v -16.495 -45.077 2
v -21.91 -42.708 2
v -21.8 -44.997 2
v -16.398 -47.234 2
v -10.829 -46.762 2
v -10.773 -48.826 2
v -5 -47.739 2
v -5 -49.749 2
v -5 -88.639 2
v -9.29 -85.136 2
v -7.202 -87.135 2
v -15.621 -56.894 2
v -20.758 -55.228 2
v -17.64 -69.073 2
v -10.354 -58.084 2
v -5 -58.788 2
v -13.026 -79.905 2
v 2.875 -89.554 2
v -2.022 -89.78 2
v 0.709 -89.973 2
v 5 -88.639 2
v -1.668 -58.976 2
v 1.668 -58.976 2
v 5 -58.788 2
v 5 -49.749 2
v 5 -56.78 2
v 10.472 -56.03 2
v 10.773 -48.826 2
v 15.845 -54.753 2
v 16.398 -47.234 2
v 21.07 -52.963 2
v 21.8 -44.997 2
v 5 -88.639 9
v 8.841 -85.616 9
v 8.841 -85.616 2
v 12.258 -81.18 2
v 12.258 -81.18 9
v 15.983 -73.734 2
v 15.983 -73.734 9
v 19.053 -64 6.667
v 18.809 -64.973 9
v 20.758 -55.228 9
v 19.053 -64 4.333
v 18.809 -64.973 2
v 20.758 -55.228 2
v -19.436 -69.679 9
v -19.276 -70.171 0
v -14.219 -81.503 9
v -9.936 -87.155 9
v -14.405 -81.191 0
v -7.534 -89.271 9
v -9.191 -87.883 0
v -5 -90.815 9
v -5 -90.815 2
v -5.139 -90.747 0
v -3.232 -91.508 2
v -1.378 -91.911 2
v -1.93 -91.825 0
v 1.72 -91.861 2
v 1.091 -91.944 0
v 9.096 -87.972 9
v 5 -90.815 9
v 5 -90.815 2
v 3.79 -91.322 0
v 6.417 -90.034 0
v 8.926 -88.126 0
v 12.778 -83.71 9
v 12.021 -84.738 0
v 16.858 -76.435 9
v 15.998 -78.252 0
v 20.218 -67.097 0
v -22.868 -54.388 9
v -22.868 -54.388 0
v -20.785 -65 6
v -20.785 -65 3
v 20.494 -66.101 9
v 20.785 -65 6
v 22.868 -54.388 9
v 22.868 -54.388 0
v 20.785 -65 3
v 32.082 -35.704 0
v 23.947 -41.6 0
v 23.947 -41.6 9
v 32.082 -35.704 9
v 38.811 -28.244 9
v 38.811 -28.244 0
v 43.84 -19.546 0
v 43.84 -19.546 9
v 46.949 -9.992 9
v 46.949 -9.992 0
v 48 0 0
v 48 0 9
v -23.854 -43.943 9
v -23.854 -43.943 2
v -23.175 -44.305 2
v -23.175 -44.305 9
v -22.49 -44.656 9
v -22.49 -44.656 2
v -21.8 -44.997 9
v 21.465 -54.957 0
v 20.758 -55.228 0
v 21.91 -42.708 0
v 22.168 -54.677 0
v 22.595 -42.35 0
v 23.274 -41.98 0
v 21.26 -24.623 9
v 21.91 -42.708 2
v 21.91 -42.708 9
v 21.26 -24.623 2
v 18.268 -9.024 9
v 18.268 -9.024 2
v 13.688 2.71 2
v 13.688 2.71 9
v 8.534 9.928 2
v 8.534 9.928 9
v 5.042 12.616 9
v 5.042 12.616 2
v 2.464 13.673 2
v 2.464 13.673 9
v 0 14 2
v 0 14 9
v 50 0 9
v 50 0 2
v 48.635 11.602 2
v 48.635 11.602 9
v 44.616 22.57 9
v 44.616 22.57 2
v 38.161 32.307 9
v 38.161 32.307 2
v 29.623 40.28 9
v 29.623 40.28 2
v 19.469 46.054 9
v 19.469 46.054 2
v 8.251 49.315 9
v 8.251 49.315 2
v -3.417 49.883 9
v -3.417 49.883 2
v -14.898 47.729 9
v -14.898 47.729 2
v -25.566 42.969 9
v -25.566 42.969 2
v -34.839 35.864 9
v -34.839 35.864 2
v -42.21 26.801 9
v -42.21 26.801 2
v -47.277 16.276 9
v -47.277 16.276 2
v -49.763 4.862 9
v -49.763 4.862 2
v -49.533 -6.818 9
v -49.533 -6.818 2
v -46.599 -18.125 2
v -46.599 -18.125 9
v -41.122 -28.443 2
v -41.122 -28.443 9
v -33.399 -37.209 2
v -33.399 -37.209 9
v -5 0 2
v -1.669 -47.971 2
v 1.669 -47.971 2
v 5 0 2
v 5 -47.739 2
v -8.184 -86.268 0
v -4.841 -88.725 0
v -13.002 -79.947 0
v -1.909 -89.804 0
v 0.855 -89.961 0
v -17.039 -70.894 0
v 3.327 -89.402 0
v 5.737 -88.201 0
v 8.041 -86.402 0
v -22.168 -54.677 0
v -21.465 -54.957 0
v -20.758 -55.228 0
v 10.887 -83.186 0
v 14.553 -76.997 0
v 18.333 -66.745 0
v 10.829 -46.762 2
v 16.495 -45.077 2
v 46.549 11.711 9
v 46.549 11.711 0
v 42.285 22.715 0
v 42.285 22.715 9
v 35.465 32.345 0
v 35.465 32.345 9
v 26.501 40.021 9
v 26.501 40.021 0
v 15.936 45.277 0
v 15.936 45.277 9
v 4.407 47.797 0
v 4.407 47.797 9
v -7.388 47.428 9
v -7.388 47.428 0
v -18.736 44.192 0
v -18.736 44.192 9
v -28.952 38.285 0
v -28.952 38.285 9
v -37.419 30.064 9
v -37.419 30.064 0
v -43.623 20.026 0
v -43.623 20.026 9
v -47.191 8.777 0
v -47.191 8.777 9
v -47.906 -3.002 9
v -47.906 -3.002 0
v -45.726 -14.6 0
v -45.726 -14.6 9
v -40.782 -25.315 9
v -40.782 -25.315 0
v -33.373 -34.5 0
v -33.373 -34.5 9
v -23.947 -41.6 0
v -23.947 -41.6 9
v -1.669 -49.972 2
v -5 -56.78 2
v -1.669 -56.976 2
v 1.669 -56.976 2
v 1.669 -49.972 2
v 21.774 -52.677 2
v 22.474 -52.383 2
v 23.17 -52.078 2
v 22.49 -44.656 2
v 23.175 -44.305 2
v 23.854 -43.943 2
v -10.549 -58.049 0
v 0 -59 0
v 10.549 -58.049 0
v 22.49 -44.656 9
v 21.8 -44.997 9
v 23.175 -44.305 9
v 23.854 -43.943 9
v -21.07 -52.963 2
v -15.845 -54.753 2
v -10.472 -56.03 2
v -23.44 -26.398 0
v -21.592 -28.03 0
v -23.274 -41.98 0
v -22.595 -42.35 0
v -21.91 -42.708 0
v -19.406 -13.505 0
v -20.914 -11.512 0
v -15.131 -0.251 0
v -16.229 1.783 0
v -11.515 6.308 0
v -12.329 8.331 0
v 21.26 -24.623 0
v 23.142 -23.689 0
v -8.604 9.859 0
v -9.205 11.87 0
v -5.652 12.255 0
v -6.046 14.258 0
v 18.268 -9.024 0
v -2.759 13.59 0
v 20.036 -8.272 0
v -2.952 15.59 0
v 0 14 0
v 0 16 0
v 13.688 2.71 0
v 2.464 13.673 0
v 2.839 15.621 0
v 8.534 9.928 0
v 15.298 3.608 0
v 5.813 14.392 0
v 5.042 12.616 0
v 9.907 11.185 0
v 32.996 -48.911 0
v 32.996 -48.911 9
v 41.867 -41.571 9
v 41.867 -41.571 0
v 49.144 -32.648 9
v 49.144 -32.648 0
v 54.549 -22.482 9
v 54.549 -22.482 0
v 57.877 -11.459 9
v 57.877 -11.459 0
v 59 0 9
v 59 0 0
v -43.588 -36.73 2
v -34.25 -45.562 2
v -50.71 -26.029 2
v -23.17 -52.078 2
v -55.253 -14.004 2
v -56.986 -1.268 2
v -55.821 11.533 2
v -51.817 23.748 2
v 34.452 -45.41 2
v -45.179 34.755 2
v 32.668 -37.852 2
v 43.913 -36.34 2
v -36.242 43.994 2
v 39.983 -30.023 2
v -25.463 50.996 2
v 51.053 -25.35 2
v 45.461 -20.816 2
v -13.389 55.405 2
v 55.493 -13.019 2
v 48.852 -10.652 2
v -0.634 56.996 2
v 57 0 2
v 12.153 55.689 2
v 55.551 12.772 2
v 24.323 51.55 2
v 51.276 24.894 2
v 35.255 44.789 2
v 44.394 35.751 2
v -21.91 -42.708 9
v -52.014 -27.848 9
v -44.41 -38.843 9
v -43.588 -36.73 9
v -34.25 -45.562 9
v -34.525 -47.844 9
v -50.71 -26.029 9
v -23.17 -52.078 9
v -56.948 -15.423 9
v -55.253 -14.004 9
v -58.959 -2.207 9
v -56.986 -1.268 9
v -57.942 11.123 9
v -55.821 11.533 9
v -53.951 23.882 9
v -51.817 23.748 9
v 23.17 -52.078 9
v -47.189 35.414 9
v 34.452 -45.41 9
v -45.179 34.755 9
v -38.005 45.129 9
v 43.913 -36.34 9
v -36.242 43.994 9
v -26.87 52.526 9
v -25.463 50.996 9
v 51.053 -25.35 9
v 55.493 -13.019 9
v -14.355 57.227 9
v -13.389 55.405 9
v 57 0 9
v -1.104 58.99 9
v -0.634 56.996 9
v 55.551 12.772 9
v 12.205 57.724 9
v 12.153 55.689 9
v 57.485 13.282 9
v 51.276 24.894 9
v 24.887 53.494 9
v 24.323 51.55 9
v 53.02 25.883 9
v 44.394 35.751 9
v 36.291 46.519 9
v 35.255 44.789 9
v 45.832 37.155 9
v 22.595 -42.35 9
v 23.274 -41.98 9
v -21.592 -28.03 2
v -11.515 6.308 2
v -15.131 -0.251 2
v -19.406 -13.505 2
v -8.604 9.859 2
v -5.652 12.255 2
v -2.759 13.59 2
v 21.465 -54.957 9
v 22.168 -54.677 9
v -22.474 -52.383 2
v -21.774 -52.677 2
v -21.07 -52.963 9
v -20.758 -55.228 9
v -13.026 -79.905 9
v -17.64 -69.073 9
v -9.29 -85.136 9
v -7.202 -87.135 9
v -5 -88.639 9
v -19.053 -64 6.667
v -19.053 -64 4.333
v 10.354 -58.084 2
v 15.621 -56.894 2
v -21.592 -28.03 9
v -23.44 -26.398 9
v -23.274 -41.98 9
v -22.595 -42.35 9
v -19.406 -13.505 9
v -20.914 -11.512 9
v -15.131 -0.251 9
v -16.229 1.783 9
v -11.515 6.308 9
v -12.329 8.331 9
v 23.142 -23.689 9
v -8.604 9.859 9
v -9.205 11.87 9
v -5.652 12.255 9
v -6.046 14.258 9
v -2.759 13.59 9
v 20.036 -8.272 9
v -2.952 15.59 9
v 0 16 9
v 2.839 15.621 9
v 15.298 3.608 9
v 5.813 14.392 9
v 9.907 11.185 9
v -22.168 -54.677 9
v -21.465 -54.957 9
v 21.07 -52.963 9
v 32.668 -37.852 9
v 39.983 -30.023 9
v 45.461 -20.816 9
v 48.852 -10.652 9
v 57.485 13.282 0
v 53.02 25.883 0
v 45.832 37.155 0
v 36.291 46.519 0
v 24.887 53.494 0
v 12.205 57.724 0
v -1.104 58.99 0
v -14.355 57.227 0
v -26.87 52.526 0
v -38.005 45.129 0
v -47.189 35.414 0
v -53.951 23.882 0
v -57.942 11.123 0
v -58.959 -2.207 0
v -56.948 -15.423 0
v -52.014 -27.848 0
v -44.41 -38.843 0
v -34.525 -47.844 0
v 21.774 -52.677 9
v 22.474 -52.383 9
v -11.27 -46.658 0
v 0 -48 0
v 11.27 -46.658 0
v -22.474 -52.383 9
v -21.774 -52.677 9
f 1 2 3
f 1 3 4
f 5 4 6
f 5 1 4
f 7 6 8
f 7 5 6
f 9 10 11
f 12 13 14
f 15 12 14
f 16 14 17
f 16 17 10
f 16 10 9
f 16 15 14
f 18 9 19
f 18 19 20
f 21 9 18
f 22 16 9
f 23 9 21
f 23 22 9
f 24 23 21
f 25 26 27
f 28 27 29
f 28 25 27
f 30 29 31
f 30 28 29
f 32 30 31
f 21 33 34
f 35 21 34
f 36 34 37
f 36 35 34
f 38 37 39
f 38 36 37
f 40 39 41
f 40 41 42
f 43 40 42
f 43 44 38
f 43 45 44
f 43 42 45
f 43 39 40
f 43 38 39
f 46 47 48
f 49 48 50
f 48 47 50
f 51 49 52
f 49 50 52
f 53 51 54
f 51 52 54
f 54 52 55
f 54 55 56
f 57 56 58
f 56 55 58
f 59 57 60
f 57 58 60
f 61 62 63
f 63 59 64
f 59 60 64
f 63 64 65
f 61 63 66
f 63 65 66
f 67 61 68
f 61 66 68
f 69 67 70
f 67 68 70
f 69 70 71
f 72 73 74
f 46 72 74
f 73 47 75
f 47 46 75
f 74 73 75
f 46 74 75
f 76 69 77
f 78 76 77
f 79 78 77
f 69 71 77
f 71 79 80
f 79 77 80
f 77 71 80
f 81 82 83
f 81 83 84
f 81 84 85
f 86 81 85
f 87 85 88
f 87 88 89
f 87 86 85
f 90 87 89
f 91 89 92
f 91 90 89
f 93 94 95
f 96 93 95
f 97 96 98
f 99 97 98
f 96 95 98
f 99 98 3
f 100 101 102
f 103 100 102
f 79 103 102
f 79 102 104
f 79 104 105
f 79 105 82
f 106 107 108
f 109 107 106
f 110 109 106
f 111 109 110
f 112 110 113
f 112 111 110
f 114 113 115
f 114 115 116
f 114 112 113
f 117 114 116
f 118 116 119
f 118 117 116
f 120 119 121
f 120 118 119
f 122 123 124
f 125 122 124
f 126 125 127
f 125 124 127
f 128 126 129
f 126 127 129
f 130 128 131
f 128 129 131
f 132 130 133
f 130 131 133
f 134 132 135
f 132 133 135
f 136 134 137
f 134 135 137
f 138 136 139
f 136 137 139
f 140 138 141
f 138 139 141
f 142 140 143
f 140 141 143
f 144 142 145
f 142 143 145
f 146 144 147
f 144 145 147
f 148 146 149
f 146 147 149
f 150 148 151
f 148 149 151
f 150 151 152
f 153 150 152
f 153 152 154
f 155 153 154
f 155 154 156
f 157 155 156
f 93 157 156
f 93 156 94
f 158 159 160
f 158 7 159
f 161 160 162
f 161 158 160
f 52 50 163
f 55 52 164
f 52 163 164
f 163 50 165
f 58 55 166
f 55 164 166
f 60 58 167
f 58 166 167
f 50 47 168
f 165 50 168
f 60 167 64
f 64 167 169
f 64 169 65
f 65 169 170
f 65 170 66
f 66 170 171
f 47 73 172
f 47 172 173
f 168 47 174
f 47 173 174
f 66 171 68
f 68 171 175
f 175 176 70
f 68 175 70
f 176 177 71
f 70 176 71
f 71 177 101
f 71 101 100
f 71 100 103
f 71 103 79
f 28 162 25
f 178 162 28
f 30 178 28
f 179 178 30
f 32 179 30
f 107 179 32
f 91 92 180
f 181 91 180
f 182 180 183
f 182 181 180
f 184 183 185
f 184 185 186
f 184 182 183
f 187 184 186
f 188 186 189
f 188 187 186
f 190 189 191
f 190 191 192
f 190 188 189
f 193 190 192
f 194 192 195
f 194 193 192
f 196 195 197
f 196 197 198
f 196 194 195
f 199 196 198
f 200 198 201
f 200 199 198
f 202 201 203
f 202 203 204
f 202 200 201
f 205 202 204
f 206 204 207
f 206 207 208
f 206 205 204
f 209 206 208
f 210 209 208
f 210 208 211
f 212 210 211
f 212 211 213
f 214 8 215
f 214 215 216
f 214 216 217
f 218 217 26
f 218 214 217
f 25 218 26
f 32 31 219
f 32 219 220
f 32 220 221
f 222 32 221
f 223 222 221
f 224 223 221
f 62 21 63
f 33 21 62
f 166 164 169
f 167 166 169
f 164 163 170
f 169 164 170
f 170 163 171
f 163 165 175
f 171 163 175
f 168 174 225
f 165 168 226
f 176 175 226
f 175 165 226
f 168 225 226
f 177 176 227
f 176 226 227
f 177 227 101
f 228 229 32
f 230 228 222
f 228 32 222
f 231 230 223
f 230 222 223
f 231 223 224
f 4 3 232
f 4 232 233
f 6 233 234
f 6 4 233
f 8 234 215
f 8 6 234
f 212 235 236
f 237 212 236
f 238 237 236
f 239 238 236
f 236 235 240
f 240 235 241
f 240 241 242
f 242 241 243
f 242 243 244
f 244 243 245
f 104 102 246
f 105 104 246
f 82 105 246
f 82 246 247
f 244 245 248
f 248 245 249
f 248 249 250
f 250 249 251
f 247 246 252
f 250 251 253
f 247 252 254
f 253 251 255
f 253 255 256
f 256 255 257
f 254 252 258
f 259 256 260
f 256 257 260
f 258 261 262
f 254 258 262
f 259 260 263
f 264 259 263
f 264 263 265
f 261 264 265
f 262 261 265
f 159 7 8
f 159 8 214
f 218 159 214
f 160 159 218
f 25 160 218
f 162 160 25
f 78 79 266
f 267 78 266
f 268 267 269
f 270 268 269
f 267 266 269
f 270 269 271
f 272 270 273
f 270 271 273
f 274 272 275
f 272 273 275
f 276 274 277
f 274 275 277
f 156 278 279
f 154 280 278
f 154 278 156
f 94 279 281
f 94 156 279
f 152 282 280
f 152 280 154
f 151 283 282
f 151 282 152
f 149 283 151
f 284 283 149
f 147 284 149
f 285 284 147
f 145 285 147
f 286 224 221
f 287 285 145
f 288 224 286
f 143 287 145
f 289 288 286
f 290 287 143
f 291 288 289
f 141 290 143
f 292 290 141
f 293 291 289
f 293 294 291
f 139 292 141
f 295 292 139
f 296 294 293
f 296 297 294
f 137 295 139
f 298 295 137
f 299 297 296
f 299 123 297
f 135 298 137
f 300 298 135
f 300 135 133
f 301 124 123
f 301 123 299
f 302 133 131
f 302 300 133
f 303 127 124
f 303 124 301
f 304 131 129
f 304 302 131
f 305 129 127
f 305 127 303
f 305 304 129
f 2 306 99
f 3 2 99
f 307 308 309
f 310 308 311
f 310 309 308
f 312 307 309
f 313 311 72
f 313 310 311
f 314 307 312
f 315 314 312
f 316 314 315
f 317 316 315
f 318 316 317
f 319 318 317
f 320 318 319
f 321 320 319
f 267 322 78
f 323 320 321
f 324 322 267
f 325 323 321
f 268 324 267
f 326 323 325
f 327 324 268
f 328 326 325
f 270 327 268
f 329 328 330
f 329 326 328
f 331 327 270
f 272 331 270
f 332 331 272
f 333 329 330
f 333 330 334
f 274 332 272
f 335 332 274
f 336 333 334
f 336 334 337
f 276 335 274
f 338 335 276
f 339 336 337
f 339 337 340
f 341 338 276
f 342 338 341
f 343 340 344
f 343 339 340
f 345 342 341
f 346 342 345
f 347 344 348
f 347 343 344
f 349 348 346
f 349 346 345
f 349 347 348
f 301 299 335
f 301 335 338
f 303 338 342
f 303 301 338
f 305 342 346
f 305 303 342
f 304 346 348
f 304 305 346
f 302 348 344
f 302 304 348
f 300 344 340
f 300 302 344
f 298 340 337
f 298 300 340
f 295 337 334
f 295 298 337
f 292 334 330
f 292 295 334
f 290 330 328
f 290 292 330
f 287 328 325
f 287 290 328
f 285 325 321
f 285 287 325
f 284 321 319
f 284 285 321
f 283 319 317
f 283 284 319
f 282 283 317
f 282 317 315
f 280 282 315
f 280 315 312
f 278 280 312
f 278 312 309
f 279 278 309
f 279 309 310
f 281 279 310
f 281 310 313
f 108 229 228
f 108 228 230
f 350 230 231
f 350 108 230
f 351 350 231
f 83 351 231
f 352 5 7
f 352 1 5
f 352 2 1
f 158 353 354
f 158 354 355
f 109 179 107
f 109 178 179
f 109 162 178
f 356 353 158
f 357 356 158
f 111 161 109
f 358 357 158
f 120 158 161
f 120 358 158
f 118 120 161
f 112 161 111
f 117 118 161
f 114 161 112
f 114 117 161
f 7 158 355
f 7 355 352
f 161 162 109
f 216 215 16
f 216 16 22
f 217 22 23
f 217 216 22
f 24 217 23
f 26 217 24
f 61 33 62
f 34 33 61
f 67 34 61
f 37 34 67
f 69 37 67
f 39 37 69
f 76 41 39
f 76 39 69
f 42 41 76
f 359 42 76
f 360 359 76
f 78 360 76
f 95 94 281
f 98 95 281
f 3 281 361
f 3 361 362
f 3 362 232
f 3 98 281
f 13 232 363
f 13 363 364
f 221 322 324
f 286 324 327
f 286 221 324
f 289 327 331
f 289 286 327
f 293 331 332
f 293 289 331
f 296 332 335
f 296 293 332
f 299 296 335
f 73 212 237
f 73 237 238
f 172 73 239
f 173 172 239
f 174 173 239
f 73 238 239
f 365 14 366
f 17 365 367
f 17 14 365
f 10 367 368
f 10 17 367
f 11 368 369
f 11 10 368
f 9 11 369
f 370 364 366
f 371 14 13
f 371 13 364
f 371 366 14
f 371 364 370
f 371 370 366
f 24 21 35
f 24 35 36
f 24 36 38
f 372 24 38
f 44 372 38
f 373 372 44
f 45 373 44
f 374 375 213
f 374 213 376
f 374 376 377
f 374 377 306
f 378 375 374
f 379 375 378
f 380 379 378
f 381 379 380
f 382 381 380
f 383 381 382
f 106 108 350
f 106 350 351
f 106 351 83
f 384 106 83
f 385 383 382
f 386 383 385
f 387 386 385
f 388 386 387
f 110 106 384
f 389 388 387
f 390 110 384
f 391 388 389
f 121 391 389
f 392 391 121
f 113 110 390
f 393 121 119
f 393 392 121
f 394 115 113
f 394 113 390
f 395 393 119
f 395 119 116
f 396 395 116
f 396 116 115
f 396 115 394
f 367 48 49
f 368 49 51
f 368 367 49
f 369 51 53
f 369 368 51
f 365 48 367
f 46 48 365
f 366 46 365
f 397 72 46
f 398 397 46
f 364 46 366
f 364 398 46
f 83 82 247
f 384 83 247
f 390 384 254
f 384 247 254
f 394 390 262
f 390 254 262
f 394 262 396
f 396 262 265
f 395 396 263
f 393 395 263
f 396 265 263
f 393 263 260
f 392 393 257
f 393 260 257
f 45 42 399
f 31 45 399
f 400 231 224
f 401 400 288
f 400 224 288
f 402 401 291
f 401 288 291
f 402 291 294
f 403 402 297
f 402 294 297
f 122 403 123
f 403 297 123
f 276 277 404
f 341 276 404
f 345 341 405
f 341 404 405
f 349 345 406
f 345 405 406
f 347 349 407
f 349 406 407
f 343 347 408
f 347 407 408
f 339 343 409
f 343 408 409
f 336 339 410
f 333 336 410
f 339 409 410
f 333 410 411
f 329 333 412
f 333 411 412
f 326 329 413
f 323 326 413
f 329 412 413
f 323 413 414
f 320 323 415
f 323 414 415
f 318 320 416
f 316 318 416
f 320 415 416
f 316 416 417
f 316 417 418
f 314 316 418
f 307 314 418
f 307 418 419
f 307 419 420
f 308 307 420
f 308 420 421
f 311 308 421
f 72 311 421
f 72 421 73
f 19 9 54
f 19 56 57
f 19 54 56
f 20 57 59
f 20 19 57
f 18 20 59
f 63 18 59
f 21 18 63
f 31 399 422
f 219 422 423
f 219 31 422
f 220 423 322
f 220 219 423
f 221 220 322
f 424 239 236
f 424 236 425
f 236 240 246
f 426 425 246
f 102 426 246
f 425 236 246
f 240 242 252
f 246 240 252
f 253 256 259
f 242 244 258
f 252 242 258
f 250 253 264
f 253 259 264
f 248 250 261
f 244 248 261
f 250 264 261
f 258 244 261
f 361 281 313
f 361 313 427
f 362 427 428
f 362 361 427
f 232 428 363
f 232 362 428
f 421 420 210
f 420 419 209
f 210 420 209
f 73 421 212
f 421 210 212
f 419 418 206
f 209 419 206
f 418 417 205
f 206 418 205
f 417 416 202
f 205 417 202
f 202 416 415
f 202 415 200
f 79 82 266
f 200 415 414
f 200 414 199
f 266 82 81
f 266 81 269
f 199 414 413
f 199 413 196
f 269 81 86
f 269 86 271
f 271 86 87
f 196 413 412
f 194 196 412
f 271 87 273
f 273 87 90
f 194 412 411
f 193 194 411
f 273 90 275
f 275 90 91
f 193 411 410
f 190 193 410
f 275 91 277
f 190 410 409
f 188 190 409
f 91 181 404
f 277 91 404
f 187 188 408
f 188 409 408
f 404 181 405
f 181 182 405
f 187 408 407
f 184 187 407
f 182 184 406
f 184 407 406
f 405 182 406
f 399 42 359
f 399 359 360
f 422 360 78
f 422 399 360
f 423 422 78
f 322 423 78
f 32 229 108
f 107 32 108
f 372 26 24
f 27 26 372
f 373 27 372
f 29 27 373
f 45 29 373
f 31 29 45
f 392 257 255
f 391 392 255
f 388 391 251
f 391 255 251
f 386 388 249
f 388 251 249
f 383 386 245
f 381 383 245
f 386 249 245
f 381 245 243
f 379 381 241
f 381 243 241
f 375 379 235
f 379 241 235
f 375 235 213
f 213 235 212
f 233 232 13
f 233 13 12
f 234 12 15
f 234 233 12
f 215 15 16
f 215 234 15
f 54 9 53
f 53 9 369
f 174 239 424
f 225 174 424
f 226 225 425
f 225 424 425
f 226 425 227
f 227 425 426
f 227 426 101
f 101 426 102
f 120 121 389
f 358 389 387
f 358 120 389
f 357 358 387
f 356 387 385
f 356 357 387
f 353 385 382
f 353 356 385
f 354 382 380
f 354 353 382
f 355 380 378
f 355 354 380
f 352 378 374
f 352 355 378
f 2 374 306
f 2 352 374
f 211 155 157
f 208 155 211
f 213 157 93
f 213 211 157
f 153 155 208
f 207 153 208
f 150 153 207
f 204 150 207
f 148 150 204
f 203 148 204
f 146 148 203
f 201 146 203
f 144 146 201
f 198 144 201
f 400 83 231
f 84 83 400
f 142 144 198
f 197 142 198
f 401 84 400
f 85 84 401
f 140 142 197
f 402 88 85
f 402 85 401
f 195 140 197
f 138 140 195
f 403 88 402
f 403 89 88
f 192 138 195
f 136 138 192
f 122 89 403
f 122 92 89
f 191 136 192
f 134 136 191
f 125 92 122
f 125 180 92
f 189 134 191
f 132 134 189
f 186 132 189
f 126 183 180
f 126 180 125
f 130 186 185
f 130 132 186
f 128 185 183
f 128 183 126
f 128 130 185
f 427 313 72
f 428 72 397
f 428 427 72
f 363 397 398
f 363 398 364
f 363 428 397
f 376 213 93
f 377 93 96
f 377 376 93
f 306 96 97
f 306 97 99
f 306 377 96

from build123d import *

# Parameters (mm, degrees)
F0_R      = 50
F0_R_2    = 48
F1_DEPTH  = 9
F2_R      = 57
F2_R_2    = 50
F3_DEPTH  = 2
F4_R      = 59
F4_R_2    = 57
F5_DEPTH  = 9
F7_DEPTH  = 9
F9_DEPTH  = 2
F11_R     = 57
F11_R_2   = 50
F12_DEPTH = 7
F14_DEPTH = 7
F15_W     = 10
F15_H     = 7
F16_DEPTH = 100


with BuildPart() as f1:
    # F0 (on Top) → F1 (new body)
    with BuildSketch(Plane.XY):
        Circle(F0_R)
        Circle(F0_R_2, mode=Mode.SUBTRACT)
    extrude(amount=F1_DEPTH)

    # F2 (on Top) → F3 (join)
    with BuildSketch(Plane.XY):
        Circle(F2_R)
        Circle(F2_R_2, mode=Mode.SUBTRACT)
    extrude(amount=F3_DEPTH)

    # F4 (on Top) → F5 (join)
    with BuildSketch(Plane.XY):
        Circle(F4_R)
        Circle(F4_R_2, mode=Mode.SUBTRACT)
    extrude(amount=F5_DEPTH)

    # F6 (on Top) → F7 (join)
    with BuildSketch(Plane.XY):
        with BuildLine():
            add(Edge.make_bspline(
                [(0, 16), (-41.5692193817, 16), (-20.7846096908, -65), (0, -146), (20.7846096908, -65), (41.5692193817, 16), (0, 16)],
                knots=[0, 0, 0, 2.0943951024, 2.0943951024, 4.1887902048, 4.1887902048, 6.2831853072, 6.2831853072, 6.2831853072], degree=2, weights=[1, 0.5, 1, 0.5, 1, 0.5, 1]))
        make_face()
        with BuildLine():
            add(Edge.make_bspline(
                [(0, 14), (-38.1051177665, 14), (-19.0525588833, -64), (0, -142), (19.0525588833, -64), (38.1051177665, 14), (0, 14)],
                knots=[0, 0, 0, 2.0943951024, 2.0943951024, 4.1887902048, 4.1887902048, 6.2831853072, 6.2831853072, 6.2831853072], degree=2, weights=[1, 0.5, 1, 0.5, 1, 0.5, 1]))
        make_face(mode=Mode.SUBTRACT)
    extrude(amount=F7_DEPTH)

    # F8 (on Top) → F9 (join)
    with BuildSketch(Plane.XY):
        with BuildLine():
            add(Edge.make_bspline(
                [(0, 14), (-38.1051177665, 14), (-19.0525588833, -64), (0, -142), (19.0525588833, -64), (38.1051177665, 14), (0, 14)],
                knots=[0, 0, 0, 2.0943951024, 2.0943951024, 4.1887902048, 4.1887902048, 6.2831853072, 6.2831853072, 6.2831853072], degree=2, weights=[1, 0.5, 1, 0.5, 1, 0.5, 1]))
        make_face()
    extrude(amount=F9_DEPTH)

    # F11 (on offset) → F12 (cut)
    with BuildSketch(Plane.XY.offset(2)):
        Circle(F11_R)
        Circle(F11_R_2, mode=Mode.SUBTRACT)
    extrude(amount=F12_DEPTH, mode=Mode.SUBTRACT)

    # F13 (on offset) → F14 (cut)
    with BuildSketch(Plane.XY.offset(2)):
        with BuildLine():
            add(Edge.make_bspline(
                [(0, 14), (-38.1051177665, 14), (-19.0525588833, -64), (0, -142), (19.0525588833, -64), (38.1051177665, 14), (0, 14)],
                knots=[0, 0, 0, 2.0943951024, 2.0943951024, 4.1887902048, 4.1887902048, 6.2831853072, 6.2831853072, 6.2831853072], degree=2, weights=[1, 0.5, 1, 0.5, 1, 0.5, 1]))
        make_face()
    extrude(amount=F14_DEPTH, mode=Mode.SUBTRACT)

    # F15 (on Front) → F16 (cut)
    with BuildSketch(Plane.XZ):
        with Locations((0, 5.5)):
            Rectangle(F15_W, F15_H)
    extrude(amount=F16_DEPTH, mode=Mode.SUBTRACT)


solid = f1.part
